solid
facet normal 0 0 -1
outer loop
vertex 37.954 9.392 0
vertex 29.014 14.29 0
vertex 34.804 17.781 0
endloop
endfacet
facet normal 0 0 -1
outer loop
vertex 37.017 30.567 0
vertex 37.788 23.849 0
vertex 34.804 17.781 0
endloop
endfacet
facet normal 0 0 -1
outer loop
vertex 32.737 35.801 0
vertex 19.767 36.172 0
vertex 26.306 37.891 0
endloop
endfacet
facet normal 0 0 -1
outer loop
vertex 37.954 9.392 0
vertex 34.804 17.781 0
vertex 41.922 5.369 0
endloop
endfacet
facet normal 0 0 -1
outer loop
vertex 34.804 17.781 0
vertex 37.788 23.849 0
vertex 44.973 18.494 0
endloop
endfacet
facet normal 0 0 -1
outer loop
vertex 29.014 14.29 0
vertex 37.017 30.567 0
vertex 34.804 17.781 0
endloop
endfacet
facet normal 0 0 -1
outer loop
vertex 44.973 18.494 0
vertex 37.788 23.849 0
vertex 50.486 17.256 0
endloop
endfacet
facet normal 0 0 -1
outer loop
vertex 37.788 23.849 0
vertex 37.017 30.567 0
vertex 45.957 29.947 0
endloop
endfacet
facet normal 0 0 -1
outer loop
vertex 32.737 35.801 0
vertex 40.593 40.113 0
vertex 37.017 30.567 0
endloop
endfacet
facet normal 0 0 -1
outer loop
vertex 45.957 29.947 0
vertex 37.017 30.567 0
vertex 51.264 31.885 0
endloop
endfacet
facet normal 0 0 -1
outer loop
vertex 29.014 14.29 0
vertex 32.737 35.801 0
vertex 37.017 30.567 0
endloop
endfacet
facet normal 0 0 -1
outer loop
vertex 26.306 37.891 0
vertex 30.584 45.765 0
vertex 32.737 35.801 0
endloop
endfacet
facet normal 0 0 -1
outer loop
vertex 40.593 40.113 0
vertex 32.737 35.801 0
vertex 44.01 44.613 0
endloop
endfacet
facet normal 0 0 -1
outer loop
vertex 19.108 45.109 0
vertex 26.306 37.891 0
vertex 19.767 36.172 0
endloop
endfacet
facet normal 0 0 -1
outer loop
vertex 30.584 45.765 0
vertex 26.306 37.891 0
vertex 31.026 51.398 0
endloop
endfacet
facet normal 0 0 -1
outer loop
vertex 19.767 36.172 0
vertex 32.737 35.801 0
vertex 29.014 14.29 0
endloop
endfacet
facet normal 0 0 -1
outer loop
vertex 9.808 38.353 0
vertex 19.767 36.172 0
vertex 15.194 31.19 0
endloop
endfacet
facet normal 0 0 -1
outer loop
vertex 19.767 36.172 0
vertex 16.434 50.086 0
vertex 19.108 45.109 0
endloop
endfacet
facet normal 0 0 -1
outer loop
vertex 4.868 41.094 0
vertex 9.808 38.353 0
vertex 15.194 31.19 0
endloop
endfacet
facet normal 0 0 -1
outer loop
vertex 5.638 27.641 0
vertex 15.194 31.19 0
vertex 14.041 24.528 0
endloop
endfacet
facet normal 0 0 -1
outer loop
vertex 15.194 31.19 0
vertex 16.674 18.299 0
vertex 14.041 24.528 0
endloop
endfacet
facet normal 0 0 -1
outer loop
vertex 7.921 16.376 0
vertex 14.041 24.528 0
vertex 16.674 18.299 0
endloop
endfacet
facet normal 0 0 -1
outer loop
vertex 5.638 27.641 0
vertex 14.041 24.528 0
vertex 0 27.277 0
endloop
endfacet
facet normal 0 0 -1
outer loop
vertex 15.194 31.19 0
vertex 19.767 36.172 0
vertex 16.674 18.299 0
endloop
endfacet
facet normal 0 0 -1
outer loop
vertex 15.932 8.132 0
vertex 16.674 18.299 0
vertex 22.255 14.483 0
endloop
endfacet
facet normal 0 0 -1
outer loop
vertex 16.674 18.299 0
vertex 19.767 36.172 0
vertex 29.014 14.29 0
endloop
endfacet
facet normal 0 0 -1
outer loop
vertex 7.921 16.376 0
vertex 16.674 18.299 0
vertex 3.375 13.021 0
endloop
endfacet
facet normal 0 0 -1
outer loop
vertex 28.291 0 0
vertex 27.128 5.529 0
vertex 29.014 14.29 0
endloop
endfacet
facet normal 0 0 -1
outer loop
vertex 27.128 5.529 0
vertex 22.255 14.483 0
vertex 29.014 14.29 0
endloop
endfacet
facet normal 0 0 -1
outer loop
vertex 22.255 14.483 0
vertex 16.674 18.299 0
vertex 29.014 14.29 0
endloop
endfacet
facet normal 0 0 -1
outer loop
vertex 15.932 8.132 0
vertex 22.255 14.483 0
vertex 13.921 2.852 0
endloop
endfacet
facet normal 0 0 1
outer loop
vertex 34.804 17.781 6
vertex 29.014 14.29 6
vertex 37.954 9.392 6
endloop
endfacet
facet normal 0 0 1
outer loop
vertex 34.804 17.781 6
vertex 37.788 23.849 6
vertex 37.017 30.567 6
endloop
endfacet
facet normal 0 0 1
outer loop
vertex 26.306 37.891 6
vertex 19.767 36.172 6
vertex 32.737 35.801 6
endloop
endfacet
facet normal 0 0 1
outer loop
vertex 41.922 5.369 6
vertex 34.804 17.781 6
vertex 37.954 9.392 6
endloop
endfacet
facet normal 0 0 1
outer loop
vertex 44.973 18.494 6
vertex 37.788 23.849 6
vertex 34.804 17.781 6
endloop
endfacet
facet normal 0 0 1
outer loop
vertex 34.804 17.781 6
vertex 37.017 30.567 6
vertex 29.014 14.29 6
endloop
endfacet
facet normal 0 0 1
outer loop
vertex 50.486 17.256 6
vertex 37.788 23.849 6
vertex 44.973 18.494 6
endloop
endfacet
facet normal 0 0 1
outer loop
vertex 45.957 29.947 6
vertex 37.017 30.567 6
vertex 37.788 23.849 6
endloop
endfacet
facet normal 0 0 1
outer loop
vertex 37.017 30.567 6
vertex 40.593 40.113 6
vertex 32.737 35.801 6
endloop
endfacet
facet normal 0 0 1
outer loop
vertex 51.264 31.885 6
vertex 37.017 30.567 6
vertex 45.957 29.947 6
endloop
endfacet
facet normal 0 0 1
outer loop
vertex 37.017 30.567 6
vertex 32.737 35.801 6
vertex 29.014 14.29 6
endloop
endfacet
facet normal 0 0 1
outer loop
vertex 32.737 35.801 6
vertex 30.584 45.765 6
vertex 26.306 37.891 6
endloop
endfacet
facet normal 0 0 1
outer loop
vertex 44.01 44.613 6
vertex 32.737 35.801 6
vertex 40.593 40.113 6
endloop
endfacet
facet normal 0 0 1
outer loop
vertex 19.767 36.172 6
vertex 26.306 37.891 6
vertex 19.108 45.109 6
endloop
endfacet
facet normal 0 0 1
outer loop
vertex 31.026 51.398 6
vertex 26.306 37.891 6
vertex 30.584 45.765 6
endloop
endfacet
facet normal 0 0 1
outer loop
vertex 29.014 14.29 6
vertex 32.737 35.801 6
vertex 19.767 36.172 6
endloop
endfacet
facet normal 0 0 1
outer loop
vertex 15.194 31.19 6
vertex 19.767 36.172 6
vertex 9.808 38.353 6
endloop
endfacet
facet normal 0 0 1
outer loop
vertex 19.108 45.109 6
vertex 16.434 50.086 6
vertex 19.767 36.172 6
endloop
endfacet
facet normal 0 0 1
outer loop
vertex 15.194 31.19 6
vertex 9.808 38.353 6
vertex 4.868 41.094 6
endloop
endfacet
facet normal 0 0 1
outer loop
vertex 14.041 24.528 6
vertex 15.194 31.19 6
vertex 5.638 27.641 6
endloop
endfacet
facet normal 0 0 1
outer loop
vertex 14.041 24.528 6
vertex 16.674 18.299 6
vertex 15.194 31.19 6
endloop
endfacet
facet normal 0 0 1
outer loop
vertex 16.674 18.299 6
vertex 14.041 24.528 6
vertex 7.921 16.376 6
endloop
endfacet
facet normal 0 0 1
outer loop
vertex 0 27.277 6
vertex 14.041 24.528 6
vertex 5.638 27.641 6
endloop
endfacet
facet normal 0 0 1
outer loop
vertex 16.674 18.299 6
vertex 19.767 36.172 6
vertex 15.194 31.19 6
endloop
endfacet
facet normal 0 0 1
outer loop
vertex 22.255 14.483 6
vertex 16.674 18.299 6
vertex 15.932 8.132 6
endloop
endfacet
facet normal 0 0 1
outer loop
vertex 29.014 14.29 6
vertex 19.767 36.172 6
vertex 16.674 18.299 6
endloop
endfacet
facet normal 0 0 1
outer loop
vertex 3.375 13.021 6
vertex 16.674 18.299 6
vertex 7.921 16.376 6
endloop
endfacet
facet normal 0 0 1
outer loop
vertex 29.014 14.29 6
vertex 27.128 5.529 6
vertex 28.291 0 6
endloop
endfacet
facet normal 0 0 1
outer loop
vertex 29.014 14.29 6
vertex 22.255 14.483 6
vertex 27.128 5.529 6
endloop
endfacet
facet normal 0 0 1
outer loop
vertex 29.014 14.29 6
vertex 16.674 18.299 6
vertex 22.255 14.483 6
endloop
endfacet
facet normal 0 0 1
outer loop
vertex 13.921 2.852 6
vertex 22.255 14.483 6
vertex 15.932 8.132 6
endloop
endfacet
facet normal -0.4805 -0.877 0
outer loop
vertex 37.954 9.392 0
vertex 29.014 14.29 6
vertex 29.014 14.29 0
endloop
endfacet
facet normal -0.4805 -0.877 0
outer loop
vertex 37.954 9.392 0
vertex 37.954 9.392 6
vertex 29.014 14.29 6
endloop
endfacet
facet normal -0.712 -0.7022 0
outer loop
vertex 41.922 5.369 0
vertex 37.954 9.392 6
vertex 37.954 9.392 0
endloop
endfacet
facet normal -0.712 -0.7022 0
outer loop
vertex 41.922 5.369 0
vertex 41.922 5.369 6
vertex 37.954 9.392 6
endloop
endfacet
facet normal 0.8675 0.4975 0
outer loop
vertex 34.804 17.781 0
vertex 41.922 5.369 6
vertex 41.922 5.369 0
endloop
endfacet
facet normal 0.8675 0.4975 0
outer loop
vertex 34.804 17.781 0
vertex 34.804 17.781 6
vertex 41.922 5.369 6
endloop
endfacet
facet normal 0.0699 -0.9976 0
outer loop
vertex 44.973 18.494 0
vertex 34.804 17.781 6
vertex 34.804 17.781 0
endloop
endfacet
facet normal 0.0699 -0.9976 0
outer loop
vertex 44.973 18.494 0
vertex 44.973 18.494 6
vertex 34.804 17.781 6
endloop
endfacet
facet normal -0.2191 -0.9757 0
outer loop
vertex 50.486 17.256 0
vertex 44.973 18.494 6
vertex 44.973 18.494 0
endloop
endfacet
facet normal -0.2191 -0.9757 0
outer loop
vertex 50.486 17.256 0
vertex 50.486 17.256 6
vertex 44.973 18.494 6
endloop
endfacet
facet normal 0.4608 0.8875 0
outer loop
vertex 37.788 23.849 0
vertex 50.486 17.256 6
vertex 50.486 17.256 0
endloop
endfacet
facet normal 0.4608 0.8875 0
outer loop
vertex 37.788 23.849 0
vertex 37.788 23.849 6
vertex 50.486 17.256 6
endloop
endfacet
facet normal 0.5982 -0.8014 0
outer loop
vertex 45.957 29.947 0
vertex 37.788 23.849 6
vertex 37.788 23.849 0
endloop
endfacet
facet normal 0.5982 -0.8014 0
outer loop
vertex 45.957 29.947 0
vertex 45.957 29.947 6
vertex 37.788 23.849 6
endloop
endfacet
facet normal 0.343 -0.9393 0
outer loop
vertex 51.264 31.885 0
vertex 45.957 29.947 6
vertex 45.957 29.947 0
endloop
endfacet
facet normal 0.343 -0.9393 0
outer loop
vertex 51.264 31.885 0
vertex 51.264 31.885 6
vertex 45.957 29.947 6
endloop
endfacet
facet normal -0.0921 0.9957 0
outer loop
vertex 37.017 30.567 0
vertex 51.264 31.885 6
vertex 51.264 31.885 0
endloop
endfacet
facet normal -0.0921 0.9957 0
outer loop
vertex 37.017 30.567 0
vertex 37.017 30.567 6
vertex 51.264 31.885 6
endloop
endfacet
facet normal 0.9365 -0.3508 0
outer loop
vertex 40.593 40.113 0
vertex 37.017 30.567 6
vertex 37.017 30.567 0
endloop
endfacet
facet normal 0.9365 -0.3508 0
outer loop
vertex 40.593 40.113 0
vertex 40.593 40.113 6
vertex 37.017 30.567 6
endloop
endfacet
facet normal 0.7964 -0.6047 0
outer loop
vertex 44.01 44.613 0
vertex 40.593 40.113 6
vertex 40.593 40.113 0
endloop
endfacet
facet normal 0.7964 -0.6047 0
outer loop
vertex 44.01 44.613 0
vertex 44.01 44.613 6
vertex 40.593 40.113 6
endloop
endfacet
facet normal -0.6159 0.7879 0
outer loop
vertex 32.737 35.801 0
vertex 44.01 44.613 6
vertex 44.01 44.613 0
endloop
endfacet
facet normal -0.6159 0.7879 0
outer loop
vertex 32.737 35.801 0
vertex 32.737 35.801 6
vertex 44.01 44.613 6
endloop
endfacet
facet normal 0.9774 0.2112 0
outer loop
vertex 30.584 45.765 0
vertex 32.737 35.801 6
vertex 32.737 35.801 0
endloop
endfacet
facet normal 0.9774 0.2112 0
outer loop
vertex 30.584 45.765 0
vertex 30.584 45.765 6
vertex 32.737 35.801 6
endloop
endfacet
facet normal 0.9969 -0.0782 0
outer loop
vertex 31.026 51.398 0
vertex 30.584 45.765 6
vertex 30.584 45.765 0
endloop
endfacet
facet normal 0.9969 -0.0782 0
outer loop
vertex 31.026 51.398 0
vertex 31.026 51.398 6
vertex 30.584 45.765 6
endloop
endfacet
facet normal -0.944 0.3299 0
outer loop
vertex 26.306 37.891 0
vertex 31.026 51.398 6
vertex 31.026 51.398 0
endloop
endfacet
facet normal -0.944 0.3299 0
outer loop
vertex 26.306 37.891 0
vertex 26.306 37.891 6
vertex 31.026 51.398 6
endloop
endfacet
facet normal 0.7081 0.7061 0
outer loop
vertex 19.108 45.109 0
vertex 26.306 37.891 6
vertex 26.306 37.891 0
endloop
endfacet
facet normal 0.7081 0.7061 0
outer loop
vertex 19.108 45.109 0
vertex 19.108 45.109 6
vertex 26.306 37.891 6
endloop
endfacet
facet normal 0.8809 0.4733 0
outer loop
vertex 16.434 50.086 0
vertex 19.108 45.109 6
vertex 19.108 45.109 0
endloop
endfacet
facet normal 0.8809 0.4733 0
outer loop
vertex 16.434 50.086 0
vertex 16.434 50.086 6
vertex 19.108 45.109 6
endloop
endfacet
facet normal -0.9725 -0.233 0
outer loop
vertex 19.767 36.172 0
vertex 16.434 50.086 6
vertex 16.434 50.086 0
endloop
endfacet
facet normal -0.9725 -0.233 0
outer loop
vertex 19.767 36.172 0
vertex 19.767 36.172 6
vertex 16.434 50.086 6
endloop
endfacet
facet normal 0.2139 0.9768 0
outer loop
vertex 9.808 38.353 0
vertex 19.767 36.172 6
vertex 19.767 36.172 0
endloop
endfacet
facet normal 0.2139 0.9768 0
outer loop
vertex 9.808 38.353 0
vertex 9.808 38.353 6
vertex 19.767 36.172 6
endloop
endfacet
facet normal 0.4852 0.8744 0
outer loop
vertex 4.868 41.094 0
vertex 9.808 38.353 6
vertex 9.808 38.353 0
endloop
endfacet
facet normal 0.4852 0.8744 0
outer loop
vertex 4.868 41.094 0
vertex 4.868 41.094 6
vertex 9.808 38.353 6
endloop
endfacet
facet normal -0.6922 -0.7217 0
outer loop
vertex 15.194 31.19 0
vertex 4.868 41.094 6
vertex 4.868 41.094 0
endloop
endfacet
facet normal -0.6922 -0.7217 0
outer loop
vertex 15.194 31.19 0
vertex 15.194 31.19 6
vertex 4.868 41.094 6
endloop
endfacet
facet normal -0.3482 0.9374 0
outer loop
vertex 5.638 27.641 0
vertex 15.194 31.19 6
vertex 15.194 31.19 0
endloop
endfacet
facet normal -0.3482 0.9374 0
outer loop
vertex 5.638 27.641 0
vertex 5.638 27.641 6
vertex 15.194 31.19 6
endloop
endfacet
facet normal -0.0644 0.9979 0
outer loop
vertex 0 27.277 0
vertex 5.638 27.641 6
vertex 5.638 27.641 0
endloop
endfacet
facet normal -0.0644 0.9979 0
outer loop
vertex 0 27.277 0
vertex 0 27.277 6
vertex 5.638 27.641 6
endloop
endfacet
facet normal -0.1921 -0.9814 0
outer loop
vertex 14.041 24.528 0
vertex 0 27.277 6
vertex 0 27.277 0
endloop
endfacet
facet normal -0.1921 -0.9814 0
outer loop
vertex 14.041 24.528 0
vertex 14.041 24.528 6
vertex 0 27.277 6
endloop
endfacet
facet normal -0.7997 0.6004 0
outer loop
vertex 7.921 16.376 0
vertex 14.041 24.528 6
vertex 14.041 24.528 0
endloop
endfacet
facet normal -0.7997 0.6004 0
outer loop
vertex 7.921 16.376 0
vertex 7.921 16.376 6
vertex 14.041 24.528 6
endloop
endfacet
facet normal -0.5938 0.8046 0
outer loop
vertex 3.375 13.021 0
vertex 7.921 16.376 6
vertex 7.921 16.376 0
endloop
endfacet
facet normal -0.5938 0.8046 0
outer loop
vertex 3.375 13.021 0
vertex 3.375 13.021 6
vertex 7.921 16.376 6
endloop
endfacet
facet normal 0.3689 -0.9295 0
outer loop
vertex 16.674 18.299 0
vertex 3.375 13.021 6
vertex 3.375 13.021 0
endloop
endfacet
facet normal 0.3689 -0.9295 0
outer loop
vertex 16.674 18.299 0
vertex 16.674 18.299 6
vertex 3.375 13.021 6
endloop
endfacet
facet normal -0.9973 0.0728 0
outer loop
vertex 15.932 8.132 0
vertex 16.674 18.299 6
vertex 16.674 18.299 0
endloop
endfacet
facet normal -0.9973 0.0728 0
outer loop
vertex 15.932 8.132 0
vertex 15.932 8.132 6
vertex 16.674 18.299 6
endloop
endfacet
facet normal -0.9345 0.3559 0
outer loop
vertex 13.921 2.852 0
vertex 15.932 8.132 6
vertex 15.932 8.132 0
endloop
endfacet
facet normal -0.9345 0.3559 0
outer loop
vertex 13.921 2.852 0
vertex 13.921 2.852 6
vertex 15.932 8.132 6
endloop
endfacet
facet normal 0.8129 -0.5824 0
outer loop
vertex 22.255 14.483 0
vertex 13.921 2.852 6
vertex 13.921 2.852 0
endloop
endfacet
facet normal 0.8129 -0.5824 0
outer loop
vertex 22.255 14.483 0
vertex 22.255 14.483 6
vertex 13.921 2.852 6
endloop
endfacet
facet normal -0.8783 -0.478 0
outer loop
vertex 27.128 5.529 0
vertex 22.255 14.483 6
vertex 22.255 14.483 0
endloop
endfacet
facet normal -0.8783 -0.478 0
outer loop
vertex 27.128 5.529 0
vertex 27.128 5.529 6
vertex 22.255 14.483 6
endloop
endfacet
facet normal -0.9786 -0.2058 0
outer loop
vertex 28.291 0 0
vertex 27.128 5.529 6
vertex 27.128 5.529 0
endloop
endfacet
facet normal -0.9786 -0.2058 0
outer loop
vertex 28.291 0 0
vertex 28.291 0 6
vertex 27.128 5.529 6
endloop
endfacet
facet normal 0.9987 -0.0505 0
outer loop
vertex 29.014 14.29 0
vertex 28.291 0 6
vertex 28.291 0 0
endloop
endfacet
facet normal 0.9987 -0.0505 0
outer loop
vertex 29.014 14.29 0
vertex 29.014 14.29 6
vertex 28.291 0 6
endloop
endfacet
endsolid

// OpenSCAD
$fn = 32;

// ----------------------------------------------------------------------
// Fan rotor section: 11 blades, 12 mm hub radius, 14 mm blades
// ----------------------------------------------------------------------

// --- parameters (mm) ---
profile_height = 6;       // extrusion height
profile_points = 33;      // points of the closed outline

profile = [[37.788, 23.849], [45.957, 29.947], [51.264, 31.885], [37.017, 30.567], [40.593, 40.113], [44.01, 44.613], [32.737, 35.801], [30.584, 45.765], [31.026, 51.398], [26.306, 37.891], [19.108, 45.109], [16.434, 50.086], [19.767, 36.172], [9.808, 38.353], [4.868, 41.094], [15.194, 31.19], [5.638, 27.641], [0, 27.277], [14.041, 24.528], [7.921, 16.376], [3.375, 13.021], [16.674, 18.299], [15.932, 8.132], [13.921, 2.852], [22.255, 14.483], [27.128, 5.529], [28.291, 0], [29.014, 14.29], [37.954, 9.392], [41.922, 5.369], [34.804, 17.781], [44.973, 18.494], [50.486, 17.256]];  // single closed polygon, 33 points, counter clockwise

// --- the one profile operation ---
linear_extrude(height = profile_height) polygon(points = profile);
